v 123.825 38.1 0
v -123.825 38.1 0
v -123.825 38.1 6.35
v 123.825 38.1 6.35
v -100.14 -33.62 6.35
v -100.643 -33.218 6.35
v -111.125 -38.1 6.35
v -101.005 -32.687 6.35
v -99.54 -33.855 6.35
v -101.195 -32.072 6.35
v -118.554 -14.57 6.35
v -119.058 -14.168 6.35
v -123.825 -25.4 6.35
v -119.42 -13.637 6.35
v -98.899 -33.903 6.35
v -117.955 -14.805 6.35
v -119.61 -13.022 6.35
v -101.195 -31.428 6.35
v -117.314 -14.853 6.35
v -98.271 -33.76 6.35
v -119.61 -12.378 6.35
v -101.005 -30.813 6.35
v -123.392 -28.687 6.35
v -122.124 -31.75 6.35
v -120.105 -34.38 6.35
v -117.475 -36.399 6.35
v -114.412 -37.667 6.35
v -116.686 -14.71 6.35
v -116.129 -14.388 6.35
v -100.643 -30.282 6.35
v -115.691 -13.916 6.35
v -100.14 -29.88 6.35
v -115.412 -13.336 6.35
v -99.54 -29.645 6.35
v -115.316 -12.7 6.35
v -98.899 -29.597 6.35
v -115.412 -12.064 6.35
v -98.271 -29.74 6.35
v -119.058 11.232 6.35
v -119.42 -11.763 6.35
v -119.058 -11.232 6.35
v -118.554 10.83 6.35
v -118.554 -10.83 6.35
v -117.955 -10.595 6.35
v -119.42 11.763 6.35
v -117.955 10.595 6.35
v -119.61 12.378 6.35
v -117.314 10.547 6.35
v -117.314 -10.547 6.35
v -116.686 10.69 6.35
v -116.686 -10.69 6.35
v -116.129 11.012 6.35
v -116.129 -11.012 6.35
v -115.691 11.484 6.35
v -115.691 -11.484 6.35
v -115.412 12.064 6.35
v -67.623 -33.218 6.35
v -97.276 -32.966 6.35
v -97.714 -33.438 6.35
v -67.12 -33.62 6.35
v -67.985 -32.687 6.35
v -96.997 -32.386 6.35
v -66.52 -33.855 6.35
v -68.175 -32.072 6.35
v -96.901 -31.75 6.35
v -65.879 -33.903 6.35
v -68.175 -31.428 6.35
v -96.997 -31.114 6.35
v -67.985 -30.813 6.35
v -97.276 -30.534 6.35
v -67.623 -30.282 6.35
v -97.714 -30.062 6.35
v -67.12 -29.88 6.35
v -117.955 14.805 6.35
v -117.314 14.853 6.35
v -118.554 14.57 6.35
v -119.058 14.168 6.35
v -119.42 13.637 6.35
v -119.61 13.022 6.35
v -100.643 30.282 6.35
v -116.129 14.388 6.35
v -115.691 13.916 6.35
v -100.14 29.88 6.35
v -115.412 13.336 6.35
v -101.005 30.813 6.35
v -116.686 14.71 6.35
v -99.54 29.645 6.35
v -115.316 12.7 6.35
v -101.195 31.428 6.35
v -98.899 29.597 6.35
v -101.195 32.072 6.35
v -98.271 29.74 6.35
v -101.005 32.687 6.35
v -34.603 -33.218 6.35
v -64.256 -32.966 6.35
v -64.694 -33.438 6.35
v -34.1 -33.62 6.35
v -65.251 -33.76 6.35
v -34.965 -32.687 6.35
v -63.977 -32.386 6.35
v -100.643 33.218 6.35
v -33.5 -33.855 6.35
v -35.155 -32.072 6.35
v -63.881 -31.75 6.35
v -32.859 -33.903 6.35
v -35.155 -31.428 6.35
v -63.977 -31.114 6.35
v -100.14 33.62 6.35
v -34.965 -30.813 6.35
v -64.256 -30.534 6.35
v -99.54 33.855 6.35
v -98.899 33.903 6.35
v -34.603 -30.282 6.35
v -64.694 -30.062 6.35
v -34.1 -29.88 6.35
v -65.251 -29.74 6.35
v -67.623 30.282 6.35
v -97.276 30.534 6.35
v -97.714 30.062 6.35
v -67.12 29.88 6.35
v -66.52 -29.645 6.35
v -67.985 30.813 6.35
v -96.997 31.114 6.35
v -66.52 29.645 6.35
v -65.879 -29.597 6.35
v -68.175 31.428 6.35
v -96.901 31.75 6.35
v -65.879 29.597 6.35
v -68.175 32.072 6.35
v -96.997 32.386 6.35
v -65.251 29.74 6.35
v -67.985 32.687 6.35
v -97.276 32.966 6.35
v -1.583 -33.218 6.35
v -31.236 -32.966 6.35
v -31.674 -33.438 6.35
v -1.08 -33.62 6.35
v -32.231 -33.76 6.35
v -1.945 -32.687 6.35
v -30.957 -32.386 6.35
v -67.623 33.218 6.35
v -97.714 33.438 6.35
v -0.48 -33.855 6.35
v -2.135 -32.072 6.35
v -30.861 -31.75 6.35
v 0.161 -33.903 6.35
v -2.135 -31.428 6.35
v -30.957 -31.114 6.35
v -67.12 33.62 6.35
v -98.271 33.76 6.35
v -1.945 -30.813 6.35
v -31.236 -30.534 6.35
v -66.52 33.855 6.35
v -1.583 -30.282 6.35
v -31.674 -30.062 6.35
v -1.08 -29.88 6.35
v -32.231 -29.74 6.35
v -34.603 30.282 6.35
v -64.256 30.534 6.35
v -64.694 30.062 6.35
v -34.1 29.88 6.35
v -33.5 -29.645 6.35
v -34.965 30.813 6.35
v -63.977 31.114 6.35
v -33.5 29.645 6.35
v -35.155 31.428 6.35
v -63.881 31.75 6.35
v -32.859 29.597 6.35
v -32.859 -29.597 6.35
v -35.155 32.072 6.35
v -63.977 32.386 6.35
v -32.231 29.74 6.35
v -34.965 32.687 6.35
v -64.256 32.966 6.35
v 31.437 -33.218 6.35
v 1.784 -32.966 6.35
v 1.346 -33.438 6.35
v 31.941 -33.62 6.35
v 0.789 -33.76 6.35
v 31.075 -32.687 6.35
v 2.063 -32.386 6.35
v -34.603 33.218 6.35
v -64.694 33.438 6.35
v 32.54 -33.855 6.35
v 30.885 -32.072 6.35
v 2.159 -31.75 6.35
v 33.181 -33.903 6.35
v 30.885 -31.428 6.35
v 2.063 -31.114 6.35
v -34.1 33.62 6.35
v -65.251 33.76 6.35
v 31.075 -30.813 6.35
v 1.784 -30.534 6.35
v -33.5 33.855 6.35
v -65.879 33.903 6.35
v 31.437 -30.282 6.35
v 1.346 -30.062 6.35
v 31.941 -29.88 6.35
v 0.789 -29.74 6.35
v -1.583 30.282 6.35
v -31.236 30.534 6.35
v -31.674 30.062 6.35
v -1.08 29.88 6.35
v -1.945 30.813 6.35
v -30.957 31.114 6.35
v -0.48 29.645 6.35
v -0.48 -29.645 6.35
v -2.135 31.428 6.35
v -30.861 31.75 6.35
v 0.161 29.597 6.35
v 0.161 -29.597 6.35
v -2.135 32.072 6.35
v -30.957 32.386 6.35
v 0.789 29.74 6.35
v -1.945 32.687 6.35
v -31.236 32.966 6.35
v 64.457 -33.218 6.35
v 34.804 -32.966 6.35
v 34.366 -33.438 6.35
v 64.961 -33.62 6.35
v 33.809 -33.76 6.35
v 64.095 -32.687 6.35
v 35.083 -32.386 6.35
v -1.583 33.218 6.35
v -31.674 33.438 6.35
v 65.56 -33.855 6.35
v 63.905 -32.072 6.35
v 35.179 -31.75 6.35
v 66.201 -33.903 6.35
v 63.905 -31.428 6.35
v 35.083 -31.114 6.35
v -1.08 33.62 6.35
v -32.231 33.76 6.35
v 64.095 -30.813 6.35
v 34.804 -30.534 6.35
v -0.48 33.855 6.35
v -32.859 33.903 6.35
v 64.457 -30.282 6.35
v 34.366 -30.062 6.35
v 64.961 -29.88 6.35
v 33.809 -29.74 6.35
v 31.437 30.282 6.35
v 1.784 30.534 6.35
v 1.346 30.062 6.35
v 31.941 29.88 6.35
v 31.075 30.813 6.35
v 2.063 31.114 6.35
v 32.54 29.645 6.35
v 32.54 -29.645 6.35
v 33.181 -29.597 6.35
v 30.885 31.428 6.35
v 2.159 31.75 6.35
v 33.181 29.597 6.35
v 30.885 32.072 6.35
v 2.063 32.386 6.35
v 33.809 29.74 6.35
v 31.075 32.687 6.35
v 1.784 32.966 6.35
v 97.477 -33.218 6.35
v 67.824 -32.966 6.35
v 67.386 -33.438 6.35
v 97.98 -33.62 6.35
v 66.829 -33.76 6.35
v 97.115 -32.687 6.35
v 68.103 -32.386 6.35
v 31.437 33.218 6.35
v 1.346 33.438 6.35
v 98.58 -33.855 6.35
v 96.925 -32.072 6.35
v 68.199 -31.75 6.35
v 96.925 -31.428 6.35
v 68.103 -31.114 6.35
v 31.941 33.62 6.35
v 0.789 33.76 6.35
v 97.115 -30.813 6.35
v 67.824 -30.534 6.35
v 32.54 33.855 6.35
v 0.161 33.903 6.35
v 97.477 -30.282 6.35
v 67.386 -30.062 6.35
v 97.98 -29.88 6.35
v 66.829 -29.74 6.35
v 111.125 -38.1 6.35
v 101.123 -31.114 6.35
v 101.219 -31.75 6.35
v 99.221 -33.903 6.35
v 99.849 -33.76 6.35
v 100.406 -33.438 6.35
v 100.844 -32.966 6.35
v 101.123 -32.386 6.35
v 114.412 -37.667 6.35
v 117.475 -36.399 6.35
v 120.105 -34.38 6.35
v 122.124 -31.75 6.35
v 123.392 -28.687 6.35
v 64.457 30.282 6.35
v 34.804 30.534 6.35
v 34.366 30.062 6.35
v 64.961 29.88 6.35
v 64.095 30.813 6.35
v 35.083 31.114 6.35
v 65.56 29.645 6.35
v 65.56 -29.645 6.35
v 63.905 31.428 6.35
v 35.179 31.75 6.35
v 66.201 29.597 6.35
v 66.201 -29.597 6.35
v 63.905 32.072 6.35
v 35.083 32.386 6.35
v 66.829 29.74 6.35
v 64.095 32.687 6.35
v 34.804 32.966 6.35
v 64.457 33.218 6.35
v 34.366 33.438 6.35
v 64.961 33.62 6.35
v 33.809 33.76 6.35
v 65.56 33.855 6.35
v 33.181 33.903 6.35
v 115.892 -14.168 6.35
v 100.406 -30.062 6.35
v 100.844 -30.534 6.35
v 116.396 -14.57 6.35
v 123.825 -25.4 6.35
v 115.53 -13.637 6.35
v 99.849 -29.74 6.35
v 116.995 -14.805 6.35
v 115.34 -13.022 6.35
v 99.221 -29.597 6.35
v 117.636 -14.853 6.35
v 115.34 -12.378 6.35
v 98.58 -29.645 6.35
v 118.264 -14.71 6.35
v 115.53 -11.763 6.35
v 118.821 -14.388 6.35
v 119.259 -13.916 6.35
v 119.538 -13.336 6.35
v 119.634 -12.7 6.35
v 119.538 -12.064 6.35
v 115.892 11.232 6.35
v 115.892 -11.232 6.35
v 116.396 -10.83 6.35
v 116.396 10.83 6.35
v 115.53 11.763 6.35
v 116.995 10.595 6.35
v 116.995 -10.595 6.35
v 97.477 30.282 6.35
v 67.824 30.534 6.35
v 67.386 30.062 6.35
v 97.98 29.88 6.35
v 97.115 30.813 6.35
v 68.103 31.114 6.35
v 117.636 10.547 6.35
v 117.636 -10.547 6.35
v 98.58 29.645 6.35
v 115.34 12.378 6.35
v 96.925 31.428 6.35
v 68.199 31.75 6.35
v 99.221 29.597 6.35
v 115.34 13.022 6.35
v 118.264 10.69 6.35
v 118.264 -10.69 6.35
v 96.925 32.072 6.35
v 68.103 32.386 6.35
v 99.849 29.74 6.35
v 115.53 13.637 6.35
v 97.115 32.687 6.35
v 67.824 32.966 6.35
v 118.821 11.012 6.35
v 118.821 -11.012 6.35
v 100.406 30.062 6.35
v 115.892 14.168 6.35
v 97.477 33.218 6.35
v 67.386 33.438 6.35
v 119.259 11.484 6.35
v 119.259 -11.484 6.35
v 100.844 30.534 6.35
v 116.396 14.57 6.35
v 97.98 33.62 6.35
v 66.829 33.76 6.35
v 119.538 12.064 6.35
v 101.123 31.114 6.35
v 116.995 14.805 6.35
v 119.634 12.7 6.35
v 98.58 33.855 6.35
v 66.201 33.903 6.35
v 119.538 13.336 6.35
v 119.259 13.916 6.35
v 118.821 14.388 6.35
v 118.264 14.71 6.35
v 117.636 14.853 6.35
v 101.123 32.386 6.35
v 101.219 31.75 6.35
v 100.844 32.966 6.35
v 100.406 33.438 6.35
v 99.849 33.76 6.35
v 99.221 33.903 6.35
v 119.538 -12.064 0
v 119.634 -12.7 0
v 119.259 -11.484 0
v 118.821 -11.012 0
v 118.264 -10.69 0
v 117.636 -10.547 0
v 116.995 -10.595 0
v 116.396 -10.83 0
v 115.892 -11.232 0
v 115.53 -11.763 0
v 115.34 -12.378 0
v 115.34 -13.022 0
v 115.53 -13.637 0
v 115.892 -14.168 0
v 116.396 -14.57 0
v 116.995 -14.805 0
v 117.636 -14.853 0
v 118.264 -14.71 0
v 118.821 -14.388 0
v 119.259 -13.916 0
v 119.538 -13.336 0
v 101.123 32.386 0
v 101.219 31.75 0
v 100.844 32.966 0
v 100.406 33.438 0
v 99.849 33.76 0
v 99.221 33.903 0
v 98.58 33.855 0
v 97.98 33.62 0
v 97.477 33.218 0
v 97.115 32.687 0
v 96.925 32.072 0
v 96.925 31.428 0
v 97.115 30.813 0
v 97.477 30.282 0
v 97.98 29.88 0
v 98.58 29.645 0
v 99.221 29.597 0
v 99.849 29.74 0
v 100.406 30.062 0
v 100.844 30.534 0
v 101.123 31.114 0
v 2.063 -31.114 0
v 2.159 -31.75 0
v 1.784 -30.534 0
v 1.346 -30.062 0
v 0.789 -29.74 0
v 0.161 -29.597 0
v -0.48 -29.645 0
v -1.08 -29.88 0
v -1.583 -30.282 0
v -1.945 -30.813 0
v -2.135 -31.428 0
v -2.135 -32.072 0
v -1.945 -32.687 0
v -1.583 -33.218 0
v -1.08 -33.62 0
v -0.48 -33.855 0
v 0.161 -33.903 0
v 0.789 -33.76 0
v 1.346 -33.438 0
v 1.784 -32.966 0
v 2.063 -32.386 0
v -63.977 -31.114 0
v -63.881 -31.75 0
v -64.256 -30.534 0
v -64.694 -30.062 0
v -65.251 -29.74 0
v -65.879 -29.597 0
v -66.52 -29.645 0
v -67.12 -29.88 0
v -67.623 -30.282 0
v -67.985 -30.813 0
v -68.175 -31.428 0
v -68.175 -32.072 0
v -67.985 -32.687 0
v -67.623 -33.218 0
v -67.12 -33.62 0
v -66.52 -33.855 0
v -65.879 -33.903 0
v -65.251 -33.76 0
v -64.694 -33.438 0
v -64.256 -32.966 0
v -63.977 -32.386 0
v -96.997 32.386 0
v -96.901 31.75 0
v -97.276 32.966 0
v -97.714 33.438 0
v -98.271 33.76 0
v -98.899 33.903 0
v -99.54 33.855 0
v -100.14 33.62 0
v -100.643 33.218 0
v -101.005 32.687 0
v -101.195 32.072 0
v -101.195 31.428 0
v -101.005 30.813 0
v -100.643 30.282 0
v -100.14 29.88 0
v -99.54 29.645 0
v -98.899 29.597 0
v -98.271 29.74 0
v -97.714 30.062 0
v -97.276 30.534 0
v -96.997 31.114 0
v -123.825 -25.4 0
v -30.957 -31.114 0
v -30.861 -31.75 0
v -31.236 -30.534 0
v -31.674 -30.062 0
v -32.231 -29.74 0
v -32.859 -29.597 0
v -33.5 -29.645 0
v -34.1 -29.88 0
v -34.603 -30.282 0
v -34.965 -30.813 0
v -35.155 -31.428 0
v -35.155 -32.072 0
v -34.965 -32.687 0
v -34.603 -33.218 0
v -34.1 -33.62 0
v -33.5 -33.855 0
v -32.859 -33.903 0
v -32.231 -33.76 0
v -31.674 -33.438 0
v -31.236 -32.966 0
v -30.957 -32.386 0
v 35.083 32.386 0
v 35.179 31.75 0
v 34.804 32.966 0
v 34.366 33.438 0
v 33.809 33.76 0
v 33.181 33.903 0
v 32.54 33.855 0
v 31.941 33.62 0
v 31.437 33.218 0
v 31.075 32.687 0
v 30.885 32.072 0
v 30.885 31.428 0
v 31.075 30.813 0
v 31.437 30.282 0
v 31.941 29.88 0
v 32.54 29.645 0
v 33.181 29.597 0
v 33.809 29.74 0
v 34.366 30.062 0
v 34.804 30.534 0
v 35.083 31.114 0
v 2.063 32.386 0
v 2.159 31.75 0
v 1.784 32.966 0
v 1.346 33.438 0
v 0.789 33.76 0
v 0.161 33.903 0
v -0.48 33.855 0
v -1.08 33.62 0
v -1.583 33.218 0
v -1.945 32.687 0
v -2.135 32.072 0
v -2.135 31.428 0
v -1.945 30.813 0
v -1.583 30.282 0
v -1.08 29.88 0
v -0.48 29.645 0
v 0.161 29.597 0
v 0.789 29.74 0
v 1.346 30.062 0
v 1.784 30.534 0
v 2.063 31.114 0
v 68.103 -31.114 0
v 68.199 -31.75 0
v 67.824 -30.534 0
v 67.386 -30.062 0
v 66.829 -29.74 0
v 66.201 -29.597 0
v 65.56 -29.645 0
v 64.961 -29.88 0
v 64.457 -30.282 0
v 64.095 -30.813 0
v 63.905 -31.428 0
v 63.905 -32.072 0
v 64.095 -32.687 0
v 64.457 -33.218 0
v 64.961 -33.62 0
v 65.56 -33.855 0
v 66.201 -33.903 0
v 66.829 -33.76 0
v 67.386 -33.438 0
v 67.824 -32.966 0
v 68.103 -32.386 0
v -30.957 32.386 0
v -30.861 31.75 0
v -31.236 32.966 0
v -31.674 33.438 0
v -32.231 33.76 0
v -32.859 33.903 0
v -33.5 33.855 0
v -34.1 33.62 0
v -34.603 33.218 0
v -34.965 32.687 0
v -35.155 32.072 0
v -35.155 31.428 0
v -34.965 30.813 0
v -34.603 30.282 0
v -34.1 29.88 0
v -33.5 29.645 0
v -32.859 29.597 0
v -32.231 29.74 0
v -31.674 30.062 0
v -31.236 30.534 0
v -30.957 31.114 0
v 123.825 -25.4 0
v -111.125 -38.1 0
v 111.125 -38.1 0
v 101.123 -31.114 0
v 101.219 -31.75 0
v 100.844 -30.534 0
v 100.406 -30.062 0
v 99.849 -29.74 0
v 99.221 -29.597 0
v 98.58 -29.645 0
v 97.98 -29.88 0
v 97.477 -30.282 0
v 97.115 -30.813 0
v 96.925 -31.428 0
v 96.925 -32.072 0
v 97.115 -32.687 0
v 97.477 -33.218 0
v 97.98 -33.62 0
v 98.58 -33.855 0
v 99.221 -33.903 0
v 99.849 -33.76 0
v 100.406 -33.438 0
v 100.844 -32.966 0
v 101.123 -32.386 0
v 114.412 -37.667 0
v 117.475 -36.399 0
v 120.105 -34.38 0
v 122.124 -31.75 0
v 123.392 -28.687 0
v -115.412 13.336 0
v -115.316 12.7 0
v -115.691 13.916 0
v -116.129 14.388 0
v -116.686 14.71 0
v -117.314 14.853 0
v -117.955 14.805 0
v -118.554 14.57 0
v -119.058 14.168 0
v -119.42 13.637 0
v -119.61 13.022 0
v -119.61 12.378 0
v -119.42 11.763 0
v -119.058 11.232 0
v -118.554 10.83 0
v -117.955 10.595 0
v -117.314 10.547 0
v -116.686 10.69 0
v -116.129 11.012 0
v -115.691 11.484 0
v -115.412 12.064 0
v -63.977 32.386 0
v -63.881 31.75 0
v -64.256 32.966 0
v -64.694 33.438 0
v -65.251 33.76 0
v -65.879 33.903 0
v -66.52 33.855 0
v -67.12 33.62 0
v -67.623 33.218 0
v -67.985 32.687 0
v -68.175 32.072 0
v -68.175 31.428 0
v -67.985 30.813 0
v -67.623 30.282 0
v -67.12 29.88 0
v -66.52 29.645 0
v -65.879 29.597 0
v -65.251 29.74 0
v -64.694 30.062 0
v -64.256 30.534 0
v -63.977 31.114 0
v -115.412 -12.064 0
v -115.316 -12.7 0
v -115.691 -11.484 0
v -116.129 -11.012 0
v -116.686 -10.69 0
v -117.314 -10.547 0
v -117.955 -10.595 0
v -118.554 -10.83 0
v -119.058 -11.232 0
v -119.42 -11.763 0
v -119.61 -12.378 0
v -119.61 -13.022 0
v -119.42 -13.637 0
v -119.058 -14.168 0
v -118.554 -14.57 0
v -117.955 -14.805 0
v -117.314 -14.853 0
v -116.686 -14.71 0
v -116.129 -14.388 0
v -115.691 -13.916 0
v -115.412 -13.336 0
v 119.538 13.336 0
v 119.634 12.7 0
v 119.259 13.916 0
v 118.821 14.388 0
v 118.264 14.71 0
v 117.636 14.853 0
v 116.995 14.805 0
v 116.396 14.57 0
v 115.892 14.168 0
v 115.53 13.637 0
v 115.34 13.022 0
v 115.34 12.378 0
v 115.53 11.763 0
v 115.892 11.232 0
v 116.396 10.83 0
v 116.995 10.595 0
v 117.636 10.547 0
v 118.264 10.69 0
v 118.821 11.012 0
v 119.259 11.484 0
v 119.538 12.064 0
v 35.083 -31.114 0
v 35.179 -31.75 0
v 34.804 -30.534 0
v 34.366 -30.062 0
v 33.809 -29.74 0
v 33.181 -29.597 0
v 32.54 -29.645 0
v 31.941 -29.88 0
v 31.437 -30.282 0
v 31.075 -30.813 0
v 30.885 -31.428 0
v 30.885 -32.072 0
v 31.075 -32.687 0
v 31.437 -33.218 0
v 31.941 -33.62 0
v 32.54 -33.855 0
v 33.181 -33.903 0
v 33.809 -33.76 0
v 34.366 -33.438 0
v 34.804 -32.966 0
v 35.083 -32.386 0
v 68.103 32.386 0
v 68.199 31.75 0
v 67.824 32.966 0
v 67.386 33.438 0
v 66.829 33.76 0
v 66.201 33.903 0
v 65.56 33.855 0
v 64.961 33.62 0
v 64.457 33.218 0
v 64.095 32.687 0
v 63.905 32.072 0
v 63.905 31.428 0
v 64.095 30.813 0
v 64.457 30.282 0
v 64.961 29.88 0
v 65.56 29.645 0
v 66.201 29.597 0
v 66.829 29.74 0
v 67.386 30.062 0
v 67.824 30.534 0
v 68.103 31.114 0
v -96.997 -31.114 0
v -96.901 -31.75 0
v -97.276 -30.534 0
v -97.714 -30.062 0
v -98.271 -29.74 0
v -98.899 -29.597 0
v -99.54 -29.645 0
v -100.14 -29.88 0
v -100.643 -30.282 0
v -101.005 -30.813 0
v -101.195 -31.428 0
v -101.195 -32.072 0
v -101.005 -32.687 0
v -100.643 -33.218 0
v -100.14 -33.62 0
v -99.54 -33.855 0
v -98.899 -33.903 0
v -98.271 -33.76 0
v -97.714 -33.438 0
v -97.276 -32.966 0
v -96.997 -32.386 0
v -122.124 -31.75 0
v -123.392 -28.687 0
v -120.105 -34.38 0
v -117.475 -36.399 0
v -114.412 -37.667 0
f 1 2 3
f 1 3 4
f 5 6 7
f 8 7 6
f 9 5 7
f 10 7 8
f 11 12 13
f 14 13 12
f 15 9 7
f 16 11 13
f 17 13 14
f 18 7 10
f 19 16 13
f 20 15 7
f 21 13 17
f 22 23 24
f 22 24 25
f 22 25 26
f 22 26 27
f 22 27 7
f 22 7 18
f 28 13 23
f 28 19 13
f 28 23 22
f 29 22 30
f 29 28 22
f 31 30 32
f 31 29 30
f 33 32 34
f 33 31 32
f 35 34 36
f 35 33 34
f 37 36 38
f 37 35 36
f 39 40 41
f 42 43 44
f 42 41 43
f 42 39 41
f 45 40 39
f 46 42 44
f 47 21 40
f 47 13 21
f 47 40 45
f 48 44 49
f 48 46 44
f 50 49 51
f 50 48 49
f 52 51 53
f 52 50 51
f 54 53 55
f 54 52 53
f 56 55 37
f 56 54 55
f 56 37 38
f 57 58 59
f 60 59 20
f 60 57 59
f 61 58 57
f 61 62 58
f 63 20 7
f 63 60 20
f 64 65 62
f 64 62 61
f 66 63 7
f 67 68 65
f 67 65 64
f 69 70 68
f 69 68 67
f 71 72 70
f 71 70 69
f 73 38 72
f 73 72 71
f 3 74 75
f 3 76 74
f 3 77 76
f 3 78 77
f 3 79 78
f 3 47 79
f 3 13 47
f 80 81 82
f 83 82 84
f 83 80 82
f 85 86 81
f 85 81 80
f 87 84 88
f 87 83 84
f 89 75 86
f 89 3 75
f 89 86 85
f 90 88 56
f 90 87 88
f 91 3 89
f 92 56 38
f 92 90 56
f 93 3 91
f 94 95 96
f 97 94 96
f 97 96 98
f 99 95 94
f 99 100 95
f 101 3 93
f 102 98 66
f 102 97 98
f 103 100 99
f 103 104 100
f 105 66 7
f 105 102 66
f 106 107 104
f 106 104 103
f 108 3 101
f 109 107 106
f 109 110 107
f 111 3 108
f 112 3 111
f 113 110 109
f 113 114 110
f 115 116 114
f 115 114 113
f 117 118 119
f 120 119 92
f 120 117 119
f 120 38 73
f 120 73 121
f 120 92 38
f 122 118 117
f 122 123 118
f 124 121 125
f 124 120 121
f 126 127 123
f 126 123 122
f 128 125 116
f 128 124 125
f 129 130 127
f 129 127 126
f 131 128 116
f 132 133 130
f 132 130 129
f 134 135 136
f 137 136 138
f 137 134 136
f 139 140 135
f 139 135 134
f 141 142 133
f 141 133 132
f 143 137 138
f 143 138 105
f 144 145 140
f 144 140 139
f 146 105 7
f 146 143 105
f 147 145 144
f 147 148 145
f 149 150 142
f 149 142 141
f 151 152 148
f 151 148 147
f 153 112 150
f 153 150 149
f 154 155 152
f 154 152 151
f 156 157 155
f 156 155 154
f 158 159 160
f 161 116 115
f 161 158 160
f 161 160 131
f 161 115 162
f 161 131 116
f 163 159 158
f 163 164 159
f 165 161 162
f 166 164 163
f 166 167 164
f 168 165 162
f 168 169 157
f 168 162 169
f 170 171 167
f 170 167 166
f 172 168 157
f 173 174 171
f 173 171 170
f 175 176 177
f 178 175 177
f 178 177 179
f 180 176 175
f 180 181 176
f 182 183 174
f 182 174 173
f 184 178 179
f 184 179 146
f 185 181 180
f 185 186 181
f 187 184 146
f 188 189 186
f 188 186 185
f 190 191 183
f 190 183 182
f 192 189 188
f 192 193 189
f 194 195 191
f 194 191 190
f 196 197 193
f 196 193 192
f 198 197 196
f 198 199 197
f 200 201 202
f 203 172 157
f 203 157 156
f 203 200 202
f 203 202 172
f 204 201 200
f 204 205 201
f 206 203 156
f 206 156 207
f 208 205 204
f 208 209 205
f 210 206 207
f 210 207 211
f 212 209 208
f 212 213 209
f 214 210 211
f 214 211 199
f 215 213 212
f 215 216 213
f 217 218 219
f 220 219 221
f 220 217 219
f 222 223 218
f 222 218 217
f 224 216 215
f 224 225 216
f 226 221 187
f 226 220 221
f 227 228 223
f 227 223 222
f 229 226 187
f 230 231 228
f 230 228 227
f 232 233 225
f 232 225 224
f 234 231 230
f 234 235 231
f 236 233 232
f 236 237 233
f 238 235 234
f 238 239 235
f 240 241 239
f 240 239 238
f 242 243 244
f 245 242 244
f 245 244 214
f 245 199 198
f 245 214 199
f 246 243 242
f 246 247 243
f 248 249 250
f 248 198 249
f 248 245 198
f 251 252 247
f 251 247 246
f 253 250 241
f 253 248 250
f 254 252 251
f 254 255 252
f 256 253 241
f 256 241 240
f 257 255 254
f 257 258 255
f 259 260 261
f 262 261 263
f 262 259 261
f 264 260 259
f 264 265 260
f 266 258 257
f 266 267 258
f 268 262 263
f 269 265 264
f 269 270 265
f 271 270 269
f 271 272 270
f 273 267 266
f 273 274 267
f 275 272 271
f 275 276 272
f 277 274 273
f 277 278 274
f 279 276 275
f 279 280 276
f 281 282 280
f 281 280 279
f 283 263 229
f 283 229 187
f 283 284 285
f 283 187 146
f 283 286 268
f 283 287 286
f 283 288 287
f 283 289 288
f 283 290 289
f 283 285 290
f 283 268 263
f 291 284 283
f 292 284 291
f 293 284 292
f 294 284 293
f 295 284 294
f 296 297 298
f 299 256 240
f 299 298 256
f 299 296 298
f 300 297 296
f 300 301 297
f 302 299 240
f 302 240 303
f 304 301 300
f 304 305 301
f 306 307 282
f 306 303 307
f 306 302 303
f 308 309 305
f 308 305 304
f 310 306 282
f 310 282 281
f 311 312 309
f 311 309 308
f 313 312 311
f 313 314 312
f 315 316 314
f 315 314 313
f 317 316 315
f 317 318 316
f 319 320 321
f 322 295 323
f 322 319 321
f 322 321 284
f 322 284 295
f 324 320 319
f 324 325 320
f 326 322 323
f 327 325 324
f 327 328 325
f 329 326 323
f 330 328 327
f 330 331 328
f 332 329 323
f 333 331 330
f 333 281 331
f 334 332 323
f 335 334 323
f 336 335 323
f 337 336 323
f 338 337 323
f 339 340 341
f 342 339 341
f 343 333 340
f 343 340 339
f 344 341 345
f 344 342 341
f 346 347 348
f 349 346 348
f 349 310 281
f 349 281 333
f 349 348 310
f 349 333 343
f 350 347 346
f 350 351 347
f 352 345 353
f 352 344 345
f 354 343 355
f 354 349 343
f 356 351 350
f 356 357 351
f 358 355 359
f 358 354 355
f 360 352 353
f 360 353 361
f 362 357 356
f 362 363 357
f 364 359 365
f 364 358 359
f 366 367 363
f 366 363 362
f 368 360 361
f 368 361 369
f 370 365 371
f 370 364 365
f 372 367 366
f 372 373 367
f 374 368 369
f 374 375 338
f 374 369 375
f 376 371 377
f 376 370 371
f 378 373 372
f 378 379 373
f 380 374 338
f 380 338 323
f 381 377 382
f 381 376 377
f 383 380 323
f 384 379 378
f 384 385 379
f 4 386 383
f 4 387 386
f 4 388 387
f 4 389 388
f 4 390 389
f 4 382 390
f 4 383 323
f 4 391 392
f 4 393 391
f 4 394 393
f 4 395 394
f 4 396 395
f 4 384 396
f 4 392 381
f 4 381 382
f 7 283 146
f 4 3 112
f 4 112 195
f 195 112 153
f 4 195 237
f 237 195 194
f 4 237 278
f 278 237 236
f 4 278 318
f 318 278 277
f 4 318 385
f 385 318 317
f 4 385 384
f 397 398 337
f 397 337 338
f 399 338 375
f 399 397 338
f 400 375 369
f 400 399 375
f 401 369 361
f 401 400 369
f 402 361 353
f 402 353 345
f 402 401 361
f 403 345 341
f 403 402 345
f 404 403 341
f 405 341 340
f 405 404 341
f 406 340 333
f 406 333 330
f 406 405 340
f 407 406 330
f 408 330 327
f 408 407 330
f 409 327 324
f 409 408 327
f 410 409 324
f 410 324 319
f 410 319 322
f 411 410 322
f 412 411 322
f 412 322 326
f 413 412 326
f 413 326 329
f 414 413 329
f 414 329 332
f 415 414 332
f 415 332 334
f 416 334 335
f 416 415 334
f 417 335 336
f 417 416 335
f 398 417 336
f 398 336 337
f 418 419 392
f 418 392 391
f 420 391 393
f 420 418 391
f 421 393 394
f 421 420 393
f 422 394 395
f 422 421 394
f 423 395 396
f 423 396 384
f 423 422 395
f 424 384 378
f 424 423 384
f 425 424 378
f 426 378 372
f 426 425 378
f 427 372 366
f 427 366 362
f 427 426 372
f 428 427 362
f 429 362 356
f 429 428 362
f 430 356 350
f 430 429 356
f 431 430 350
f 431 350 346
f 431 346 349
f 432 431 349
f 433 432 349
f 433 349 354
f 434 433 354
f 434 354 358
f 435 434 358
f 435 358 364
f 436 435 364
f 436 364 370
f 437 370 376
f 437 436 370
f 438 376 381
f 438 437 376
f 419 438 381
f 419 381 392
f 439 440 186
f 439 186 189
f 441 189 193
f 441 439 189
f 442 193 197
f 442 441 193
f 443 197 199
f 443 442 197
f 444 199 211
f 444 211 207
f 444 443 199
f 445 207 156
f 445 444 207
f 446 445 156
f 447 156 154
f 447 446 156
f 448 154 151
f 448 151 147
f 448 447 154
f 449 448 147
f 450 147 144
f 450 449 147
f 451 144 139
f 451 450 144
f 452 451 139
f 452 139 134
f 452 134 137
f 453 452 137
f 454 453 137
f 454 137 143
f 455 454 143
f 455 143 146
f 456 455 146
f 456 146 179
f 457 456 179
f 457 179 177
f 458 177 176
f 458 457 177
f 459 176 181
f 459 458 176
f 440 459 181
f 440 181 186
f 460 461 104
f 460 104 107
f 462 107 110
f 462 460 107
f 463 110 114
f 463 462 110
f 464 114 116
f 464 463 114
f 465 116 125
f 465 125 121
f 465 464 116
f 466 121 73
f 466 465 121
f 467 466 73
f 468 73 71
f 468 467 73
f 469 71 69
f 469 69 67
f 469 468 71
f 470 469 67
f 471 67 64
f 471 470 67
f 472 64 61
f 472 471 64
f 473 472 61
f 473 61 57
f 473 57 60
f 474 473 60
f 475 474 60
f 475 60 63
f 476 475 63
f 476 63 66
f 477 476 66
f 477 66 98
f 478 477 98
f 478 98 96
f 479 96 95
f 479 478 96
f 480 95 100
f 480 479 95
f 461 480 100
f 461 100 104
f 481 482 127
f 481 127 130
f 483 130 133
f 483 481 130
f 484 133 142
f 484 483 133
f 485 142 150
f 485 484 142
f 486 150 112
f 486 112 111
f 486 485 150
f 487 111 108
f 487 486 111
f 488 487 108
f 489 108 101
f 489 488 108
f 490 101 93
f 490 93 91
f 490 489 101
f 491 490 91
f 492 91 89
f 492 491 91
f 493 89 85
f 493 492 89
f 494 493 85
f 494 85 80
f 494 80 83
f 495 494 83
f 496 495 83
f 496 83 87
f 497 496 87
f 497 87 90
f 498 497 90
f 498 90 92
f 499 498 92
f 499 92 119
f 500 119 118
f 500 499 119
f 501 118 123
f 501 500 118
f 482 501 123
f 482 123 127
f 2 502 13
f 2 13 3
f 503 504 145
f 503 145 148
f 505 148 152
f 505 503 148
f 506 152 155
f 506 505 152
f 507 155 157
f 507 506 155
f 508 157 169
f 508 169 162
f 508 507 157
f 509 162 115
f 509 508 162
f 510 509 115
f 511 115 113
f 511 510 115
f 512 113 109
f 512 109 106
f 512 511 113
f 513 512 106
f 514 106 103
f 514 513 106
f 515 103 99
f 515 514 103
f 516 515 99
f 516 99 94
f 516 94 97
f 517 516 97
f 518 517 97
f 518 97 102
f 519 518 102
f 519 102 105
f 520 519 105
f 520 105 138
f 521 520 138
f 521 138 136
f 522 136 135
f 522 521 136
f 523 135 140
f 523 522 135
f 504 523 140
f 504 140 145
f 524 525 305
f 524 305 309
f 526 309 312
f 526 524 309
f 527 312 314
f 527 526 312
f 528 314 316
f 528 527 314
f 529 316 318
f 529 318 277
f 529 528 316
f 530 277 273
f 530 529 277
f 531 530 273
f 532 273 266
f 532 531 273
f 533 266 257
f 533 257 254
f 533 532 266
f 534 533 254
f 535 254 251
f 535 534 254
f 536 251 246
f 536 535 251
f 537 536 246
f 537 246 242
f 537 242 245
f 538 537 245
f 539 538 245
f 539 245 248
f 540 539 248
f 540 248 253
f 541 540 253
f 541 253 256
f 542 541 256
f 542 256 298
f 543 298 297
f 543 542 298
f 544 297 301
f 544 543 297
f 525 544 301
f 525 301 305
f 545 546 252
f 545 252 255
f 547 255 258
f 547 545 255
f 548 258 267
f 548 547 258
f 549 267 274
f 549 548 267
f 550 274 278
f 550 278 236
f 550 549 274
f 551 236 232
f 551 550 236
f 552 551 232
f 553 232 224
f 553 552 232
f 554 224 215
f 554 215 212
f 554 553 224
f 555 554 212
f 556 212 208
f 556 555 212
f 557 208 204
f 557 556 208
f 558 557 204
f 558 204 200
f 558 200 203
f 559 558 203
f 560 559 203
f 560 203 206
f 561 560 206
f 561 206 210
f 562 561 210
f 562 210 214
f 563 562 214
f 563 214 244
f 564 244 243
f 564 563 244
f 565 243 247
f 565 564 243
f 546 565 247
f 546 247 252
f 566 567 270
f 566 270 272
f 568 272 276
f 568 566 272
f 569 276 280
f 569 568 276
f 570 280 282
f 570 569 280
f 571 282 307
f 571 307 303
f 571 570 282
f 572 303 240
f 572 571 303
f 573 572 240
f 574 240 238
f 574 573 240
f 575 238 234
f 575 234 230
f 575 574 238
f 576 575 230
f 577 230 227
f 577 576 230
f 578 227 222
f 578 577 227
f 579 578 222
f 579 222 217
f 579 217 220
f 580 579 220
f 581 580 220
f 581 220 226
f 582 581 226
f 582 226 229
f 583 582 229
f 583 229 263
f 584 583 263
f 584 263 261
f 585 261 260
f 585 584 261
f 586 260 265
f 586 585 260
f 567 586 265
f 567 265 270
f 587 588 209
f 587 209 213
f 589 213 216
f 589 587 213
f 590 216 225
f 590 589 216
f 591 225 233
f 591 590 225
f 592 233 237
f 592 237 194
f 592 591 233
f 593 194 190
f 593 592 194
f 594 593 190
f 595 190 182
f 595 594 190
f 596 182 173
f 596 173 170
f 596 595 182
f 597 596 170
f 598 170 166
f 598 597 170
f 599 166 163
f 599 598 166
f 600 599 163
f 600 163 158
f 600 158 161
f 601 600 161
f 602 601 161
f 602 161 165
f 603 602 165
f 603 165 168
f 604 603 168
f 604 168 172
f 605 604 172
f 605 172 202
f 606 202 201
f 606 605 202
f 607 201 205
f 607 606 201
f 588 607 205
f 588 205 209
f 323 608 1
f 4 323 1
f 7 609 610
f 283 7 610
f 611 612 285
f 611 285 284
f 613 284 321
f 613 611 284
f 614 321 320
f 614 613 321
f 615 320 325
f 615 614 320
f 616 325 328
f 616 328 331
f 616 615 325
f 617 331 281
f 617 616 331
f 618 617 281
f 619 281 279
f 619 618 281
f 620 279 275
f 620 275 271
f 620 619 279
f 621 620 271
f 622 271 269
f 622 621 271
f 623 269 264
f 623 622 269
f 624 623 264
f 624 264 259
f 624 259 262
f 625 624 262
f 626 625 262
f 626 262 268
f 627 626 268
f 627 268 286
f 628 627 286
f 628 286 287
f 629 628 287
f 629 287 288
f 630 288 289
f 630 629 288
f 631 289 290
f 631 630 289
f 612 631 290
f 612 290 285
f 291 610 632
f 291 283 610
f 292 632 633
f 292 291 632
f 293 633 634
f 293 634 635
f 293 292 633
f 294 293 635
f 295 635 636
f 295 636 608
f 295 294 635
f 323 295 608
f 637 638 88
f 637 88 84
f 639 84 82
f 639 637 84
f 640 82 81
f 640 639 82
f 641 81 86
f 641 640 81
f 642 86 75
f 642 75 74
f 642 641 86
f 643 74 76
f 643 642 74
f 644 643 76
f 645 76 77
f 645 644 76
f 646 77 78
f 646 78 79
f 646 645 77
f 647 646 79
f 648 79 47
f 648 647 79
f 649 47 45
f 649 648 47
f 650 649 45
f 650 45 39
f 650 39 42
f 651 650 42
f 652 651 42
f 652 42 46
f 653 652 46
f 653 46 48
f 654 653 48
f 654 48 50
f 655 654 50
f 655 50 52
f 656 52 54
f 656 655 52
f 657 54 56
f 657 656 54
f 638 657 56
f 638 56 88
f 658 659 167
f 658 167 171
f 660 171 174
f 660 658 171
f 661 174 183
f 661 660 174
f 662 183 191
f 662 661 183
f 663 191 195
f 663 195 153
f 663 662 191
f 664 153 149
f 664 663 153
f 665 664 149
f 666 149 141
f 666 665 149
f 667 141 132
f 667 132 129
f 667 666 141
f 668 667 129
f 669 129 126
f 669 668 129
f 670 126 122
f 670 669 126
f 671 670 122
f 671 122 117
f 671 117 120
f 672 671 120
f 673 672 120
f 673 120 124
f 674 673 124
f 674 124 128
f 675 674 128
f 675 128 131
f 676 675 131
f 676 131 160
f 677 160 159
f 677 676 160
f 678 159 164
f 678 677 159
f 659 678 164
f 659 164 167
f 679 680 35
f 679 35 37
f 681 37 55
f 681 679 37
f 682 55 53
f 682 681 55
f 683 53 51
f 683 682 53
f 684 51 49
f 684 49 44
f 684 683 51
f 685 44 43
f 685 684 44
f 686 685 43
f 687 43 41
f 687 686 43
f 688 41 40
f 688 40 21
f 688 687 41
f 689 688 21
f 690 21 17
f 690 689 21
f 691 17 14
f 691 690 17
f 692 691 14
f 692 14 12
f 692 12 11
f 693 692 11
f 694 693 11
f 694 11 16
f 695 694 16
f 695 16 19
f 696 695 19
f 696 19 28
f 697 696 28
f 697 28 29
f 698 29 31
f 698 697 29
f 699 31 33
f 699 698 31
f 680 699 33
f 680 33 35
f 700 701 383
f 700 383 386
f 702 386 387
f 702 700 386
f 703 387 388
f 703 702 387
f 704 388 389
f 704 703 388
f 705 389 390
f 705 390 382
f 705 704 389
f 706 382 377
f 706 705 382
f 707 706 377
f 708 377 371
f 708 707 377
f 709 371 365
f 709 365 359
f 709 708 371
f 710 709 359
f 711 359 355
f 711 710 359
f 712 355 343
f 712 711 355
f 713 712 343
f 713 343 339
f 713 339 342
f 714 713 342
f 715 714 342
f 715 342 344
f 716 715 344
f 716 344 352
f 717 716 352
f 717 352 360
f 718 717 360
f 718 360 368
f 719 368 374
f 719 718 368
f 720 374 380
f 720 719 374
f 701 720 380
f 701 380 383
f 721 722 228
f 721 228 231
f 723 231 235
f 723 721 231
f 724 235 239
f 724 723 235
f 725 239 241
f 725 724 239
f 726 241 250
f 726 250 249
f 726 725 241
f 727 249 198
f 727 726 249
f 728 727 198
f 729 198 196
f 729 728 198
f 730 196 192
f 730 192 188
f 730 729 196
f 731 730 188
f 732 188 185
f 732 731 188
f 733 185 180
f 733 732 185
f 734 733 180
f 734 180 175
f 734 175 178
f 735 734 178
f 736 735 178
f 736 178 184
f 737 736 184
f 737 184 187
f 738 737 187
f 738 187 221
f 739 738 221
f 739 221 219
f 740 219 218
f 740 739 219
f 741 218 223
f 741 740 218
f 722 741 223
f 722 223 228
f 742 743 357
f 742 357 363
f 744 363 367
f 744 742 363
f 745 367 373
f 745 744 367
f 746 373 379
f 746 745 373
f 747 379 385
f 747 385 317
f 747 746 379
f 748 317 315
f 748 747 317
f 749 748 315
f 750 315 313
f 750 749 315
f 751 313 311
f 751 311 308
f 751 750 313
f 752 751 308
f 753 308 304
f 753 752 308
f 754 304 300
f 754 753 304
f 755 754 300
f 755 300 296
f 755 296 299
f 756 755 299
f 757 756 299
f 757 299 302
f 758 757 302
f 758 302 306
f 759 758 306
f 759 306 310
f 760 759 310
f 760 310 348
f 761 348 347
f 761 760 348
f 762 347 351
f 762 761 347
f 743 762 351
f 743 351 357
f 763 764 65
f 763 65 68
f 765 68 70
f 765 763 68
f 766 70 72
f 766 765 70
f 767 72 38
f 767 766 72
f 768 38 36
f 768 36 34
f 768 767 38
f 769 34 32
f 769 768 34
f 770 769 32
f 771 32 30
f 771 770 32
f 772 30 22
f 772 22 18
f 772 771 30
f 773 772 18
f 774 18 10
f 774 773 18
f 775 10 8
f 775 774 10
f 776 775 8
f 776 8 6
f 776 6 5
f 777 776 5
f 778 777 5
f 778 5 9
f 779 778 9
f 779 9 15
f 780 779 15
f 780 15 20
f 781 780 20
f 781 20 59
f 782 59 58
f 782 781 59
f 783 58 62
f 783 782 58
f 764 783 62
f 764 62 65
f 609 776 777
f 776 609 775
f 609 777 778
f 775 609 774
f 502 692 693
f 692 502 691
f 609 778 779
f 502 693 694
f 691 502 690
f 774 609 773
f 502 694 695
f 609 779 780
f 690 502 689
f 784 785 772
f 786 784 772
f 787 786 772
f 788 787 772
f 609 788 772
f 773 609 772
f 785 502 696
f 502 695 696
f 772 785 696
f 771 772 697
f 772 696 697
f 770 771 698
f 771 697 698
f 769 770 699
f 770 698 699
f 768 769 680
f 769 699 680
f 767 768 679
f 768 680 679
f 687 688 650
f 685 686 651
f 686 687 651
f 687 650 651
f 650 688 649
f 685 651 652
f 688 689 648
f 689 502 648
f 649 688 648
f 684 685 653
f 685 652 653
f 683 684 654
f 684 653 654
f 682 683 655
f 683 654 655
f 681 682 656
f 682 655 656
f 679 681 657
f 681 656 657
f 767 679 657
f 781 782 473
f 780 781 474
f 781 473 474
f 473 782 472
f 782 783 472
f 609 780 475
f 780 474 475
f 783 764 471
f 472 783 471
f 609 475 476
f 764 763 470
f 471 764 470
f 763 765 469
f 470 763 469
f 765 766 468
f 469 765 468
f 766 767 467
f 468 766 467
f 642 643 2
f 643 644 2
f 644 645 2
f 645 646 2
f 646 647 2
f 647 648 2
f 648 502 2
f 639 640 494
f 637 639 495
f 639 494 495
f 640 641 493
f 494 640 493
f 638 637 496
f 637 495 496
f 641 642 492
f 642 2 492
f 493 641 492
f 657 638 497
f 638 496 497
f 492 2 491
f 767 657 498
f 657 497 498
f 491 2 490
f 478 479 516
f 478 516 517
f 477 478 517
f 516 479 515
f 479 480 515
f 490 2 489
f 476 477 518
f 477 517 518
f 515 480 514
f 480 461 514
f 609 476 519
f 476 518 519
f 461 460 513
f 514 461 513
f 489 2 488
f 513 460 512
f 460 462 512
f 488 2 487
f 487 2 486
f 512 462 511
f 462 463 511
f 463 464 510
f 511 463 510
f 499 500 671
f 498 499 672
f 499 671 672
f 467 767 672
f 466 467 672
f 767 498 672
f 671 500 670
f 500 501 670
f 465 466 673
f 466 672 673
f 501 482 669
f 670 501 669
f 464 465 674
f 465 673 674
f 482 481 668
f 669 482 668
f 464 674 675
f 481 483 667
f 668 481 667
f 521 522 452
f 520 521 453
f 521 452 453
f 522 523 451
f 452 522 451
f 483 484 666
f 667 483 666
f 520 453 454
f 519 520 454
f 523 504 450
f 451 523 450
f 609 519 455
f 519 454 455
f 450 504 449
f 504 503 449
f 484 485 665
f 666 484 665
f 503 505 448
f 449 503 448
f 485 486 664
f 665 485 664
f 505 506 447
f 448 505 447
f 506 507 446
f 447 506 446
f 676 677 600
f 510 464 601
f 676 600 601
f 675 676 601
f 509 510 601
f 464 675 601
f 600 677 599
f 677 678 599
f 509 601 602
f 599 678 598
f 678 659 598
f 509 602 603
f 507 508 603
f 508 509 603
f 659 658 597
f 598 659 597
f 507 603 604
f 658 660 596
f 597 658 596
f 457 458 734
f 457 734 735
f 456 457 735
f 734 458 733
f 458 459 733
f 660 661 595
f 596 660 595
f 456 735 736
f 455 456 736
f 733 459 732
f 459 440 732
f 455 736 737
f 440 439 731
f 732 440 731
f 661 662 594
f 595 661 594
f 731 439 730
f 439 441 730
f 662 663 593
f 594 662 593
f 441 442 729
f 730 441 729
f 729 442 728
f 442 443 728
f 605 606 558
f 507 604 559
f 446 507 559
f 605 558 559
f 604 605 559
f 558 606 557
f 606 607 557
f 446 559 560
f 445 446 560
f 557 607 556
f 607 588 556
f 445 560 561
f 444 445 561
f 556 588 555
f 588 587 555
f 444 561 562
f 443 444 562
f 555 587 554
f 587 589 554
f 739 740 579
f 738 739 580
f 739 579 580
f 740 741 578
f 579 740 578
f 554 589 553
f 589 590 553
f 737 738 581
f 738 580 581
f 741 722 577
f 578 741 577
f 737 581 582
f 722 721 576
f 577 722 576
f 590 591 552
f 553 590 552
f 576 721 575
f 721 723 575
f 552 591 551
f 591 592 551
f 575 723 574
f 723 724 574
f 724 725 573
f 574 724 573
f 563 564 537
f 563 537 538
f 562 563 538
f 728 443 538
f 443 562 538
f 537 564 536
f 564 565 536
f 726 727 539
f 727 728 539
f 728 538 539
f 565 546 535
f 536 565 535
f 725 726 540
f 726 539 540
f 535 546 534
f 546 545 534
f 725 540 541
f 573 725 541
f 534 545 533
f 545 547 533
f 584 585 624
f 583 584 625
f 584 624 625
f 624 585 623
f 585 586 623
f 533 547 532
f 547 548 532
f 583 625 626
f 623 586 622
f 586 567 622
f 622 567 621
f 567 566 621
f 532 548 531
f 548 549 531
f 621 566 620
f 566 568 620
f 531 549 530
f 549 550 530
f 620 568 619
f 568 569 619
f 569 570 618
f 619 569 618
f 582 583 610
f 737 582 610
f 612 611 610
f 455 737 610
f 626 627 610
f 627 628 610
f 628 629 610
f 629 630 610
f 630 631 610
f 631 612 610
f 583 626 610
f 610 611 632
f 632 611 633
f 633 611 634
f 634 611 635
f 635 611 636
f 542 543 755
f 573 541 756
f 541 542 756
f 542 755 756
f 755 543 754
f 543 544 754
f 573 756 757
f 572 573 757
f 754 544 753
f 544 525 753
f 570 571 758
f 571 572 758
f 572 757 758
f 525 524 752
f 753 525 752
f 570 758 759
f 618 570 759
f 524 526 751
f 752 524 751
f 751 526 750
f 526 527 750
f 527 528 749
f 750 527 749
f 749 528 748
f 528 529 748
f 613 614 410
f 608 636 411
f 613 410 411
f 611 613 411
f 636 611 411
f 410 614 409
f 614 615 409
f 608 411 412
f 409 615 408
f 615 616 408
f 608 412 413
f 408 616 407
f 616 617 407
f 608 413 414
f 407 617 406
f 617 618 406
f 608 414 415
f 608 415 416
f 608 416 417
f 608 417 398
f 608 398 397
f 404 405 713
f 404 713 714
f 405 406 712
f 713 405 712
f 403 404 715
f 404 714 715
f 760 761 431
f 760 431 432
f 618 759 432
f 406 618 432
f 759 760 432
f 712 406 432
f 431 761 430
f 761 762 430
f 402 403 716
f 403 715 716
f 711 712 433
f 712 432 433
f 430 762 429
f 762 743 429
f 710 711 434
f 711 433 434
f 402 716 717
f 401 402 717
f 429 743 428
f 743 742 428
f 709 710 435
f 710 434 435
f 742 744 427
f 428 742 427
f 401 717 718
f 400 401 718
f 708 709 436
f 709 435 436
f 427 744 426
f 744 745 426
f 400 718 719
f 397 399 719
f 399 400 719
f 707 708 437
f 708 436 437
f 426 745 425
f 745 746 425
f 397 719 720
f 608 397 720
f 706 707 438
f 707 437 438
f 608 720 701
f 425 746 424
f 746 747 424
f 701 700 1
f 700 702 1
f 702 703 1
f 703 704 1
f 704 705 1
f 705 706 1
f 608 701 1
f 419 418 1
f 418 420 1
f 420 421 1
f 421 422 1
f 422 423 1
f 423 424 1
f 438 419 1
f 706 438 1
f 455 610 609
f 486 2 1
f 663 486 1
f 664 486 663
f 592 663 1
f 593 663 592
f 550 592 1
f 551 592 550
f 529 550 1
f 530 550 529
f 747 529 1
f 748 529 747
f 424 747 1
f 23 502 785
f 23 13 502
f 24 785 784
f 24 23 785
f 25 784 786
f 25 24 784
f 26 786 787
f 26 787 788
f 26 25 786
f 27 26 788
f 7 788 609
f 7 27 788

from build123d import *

# Parameters (mm, degrees)
SKETCH1_W           = 247.65
SKETCH1_H           = 76.2
SKETCH1_R           = 2.159
BOSS_EXTRUDE1_DEPTH = 6.35
FILLET1_R           = 12.7


with BuildPart() as part:
    # Sketch1 → Boss-Extrude1 (new body)
    with BuildSketch(Plane.XY):
        Rectangle(SKETCH1_W, SKETCH1_H)
        with Locations((-117.475, 12.7)):
            Circle(SKETCH1_R, mode=Mode.SUBTRACT)
        with Locations((-117.475, -12.7)):
            Circle(SKETCH1_R, mode=Mode.SUBTRACT)
        with Locations((-99.06, -31.75)):
            Circle(SKETCH1_R, mode=Mode.SUBTRACT)
        with Locations((-66.04, -31.75)):
            Circle(SKETCH1_R, mode=Mode.SUBTRACT)
        with Locations((-33.02, -31.75)):
            Circle(SKETCH1_R, mode=Mode.SUBTRACT)
        with Locations((0, -31.75)):
            Circle(SKETCH1_R, mode=Mode.SUBTRACT)
        with Locations((33.02, -31.75)):
            Circle(SKETCH1_R, mode=Mode.SUBTRACT)
        with Locations((66.04, -31.75)):
            Circle(SKETCH1_R, mode=Mode.SUBTRACT)
        with Locations((99.06, -31.75)):
            Circle(SKETCH1_R, mode=Mode.SUBTRACT)
        with Locations((117.475, -12.7)):
            Circle(SKETCH1_R, mode=Mode.SUBTRACT)
        with Locations((117.475, 12.7)):
            Circle(SKETCH1_R, mode=Mode.SUBTRACT)
        with Locations((99.06, 31.75)):
            Circle(SKETCH1_R, mode=Mode.SUBTRACT)
        with Locations((66.04, 31.75)):
            Circle(SKETCH1_R, mode=Mode.SUBTRACT)
        with Locations((33.02, 31.75)):
            Circle(SKETCH1_R, mode=Mode.SUBTRACT)
        with Locations((0, 31.75)):
            Circle(SKETCH1_R, mode=Mode.SUBTRACT)
        with Locations((-33.02, 31.75)):
            Circle(SKETCH1_R, mode=Mode.SUBTRACT)
        with Locations((-66.04, 31.75)):
            Circle(SKETCH1_R, mode=Mode.SUBTRACT)
        with Locations((-99.06, 31.75)):
            Circle(SKETCH1_R, mode=Mode.SUBTRACT)
    extrude(amount=BOSS_EXTRUDE1_DEPTH)

    # Fillet1
    fillet1_edges = [part.edges().sort_by_distance(p)[0] for p in [
        (123.825, -38.1, 3.175),
        (-123.825, -38.1, 3.175),
    ]]
    fillet(fillet1_edges, radius=FILLET1_R)


solid = part.part
